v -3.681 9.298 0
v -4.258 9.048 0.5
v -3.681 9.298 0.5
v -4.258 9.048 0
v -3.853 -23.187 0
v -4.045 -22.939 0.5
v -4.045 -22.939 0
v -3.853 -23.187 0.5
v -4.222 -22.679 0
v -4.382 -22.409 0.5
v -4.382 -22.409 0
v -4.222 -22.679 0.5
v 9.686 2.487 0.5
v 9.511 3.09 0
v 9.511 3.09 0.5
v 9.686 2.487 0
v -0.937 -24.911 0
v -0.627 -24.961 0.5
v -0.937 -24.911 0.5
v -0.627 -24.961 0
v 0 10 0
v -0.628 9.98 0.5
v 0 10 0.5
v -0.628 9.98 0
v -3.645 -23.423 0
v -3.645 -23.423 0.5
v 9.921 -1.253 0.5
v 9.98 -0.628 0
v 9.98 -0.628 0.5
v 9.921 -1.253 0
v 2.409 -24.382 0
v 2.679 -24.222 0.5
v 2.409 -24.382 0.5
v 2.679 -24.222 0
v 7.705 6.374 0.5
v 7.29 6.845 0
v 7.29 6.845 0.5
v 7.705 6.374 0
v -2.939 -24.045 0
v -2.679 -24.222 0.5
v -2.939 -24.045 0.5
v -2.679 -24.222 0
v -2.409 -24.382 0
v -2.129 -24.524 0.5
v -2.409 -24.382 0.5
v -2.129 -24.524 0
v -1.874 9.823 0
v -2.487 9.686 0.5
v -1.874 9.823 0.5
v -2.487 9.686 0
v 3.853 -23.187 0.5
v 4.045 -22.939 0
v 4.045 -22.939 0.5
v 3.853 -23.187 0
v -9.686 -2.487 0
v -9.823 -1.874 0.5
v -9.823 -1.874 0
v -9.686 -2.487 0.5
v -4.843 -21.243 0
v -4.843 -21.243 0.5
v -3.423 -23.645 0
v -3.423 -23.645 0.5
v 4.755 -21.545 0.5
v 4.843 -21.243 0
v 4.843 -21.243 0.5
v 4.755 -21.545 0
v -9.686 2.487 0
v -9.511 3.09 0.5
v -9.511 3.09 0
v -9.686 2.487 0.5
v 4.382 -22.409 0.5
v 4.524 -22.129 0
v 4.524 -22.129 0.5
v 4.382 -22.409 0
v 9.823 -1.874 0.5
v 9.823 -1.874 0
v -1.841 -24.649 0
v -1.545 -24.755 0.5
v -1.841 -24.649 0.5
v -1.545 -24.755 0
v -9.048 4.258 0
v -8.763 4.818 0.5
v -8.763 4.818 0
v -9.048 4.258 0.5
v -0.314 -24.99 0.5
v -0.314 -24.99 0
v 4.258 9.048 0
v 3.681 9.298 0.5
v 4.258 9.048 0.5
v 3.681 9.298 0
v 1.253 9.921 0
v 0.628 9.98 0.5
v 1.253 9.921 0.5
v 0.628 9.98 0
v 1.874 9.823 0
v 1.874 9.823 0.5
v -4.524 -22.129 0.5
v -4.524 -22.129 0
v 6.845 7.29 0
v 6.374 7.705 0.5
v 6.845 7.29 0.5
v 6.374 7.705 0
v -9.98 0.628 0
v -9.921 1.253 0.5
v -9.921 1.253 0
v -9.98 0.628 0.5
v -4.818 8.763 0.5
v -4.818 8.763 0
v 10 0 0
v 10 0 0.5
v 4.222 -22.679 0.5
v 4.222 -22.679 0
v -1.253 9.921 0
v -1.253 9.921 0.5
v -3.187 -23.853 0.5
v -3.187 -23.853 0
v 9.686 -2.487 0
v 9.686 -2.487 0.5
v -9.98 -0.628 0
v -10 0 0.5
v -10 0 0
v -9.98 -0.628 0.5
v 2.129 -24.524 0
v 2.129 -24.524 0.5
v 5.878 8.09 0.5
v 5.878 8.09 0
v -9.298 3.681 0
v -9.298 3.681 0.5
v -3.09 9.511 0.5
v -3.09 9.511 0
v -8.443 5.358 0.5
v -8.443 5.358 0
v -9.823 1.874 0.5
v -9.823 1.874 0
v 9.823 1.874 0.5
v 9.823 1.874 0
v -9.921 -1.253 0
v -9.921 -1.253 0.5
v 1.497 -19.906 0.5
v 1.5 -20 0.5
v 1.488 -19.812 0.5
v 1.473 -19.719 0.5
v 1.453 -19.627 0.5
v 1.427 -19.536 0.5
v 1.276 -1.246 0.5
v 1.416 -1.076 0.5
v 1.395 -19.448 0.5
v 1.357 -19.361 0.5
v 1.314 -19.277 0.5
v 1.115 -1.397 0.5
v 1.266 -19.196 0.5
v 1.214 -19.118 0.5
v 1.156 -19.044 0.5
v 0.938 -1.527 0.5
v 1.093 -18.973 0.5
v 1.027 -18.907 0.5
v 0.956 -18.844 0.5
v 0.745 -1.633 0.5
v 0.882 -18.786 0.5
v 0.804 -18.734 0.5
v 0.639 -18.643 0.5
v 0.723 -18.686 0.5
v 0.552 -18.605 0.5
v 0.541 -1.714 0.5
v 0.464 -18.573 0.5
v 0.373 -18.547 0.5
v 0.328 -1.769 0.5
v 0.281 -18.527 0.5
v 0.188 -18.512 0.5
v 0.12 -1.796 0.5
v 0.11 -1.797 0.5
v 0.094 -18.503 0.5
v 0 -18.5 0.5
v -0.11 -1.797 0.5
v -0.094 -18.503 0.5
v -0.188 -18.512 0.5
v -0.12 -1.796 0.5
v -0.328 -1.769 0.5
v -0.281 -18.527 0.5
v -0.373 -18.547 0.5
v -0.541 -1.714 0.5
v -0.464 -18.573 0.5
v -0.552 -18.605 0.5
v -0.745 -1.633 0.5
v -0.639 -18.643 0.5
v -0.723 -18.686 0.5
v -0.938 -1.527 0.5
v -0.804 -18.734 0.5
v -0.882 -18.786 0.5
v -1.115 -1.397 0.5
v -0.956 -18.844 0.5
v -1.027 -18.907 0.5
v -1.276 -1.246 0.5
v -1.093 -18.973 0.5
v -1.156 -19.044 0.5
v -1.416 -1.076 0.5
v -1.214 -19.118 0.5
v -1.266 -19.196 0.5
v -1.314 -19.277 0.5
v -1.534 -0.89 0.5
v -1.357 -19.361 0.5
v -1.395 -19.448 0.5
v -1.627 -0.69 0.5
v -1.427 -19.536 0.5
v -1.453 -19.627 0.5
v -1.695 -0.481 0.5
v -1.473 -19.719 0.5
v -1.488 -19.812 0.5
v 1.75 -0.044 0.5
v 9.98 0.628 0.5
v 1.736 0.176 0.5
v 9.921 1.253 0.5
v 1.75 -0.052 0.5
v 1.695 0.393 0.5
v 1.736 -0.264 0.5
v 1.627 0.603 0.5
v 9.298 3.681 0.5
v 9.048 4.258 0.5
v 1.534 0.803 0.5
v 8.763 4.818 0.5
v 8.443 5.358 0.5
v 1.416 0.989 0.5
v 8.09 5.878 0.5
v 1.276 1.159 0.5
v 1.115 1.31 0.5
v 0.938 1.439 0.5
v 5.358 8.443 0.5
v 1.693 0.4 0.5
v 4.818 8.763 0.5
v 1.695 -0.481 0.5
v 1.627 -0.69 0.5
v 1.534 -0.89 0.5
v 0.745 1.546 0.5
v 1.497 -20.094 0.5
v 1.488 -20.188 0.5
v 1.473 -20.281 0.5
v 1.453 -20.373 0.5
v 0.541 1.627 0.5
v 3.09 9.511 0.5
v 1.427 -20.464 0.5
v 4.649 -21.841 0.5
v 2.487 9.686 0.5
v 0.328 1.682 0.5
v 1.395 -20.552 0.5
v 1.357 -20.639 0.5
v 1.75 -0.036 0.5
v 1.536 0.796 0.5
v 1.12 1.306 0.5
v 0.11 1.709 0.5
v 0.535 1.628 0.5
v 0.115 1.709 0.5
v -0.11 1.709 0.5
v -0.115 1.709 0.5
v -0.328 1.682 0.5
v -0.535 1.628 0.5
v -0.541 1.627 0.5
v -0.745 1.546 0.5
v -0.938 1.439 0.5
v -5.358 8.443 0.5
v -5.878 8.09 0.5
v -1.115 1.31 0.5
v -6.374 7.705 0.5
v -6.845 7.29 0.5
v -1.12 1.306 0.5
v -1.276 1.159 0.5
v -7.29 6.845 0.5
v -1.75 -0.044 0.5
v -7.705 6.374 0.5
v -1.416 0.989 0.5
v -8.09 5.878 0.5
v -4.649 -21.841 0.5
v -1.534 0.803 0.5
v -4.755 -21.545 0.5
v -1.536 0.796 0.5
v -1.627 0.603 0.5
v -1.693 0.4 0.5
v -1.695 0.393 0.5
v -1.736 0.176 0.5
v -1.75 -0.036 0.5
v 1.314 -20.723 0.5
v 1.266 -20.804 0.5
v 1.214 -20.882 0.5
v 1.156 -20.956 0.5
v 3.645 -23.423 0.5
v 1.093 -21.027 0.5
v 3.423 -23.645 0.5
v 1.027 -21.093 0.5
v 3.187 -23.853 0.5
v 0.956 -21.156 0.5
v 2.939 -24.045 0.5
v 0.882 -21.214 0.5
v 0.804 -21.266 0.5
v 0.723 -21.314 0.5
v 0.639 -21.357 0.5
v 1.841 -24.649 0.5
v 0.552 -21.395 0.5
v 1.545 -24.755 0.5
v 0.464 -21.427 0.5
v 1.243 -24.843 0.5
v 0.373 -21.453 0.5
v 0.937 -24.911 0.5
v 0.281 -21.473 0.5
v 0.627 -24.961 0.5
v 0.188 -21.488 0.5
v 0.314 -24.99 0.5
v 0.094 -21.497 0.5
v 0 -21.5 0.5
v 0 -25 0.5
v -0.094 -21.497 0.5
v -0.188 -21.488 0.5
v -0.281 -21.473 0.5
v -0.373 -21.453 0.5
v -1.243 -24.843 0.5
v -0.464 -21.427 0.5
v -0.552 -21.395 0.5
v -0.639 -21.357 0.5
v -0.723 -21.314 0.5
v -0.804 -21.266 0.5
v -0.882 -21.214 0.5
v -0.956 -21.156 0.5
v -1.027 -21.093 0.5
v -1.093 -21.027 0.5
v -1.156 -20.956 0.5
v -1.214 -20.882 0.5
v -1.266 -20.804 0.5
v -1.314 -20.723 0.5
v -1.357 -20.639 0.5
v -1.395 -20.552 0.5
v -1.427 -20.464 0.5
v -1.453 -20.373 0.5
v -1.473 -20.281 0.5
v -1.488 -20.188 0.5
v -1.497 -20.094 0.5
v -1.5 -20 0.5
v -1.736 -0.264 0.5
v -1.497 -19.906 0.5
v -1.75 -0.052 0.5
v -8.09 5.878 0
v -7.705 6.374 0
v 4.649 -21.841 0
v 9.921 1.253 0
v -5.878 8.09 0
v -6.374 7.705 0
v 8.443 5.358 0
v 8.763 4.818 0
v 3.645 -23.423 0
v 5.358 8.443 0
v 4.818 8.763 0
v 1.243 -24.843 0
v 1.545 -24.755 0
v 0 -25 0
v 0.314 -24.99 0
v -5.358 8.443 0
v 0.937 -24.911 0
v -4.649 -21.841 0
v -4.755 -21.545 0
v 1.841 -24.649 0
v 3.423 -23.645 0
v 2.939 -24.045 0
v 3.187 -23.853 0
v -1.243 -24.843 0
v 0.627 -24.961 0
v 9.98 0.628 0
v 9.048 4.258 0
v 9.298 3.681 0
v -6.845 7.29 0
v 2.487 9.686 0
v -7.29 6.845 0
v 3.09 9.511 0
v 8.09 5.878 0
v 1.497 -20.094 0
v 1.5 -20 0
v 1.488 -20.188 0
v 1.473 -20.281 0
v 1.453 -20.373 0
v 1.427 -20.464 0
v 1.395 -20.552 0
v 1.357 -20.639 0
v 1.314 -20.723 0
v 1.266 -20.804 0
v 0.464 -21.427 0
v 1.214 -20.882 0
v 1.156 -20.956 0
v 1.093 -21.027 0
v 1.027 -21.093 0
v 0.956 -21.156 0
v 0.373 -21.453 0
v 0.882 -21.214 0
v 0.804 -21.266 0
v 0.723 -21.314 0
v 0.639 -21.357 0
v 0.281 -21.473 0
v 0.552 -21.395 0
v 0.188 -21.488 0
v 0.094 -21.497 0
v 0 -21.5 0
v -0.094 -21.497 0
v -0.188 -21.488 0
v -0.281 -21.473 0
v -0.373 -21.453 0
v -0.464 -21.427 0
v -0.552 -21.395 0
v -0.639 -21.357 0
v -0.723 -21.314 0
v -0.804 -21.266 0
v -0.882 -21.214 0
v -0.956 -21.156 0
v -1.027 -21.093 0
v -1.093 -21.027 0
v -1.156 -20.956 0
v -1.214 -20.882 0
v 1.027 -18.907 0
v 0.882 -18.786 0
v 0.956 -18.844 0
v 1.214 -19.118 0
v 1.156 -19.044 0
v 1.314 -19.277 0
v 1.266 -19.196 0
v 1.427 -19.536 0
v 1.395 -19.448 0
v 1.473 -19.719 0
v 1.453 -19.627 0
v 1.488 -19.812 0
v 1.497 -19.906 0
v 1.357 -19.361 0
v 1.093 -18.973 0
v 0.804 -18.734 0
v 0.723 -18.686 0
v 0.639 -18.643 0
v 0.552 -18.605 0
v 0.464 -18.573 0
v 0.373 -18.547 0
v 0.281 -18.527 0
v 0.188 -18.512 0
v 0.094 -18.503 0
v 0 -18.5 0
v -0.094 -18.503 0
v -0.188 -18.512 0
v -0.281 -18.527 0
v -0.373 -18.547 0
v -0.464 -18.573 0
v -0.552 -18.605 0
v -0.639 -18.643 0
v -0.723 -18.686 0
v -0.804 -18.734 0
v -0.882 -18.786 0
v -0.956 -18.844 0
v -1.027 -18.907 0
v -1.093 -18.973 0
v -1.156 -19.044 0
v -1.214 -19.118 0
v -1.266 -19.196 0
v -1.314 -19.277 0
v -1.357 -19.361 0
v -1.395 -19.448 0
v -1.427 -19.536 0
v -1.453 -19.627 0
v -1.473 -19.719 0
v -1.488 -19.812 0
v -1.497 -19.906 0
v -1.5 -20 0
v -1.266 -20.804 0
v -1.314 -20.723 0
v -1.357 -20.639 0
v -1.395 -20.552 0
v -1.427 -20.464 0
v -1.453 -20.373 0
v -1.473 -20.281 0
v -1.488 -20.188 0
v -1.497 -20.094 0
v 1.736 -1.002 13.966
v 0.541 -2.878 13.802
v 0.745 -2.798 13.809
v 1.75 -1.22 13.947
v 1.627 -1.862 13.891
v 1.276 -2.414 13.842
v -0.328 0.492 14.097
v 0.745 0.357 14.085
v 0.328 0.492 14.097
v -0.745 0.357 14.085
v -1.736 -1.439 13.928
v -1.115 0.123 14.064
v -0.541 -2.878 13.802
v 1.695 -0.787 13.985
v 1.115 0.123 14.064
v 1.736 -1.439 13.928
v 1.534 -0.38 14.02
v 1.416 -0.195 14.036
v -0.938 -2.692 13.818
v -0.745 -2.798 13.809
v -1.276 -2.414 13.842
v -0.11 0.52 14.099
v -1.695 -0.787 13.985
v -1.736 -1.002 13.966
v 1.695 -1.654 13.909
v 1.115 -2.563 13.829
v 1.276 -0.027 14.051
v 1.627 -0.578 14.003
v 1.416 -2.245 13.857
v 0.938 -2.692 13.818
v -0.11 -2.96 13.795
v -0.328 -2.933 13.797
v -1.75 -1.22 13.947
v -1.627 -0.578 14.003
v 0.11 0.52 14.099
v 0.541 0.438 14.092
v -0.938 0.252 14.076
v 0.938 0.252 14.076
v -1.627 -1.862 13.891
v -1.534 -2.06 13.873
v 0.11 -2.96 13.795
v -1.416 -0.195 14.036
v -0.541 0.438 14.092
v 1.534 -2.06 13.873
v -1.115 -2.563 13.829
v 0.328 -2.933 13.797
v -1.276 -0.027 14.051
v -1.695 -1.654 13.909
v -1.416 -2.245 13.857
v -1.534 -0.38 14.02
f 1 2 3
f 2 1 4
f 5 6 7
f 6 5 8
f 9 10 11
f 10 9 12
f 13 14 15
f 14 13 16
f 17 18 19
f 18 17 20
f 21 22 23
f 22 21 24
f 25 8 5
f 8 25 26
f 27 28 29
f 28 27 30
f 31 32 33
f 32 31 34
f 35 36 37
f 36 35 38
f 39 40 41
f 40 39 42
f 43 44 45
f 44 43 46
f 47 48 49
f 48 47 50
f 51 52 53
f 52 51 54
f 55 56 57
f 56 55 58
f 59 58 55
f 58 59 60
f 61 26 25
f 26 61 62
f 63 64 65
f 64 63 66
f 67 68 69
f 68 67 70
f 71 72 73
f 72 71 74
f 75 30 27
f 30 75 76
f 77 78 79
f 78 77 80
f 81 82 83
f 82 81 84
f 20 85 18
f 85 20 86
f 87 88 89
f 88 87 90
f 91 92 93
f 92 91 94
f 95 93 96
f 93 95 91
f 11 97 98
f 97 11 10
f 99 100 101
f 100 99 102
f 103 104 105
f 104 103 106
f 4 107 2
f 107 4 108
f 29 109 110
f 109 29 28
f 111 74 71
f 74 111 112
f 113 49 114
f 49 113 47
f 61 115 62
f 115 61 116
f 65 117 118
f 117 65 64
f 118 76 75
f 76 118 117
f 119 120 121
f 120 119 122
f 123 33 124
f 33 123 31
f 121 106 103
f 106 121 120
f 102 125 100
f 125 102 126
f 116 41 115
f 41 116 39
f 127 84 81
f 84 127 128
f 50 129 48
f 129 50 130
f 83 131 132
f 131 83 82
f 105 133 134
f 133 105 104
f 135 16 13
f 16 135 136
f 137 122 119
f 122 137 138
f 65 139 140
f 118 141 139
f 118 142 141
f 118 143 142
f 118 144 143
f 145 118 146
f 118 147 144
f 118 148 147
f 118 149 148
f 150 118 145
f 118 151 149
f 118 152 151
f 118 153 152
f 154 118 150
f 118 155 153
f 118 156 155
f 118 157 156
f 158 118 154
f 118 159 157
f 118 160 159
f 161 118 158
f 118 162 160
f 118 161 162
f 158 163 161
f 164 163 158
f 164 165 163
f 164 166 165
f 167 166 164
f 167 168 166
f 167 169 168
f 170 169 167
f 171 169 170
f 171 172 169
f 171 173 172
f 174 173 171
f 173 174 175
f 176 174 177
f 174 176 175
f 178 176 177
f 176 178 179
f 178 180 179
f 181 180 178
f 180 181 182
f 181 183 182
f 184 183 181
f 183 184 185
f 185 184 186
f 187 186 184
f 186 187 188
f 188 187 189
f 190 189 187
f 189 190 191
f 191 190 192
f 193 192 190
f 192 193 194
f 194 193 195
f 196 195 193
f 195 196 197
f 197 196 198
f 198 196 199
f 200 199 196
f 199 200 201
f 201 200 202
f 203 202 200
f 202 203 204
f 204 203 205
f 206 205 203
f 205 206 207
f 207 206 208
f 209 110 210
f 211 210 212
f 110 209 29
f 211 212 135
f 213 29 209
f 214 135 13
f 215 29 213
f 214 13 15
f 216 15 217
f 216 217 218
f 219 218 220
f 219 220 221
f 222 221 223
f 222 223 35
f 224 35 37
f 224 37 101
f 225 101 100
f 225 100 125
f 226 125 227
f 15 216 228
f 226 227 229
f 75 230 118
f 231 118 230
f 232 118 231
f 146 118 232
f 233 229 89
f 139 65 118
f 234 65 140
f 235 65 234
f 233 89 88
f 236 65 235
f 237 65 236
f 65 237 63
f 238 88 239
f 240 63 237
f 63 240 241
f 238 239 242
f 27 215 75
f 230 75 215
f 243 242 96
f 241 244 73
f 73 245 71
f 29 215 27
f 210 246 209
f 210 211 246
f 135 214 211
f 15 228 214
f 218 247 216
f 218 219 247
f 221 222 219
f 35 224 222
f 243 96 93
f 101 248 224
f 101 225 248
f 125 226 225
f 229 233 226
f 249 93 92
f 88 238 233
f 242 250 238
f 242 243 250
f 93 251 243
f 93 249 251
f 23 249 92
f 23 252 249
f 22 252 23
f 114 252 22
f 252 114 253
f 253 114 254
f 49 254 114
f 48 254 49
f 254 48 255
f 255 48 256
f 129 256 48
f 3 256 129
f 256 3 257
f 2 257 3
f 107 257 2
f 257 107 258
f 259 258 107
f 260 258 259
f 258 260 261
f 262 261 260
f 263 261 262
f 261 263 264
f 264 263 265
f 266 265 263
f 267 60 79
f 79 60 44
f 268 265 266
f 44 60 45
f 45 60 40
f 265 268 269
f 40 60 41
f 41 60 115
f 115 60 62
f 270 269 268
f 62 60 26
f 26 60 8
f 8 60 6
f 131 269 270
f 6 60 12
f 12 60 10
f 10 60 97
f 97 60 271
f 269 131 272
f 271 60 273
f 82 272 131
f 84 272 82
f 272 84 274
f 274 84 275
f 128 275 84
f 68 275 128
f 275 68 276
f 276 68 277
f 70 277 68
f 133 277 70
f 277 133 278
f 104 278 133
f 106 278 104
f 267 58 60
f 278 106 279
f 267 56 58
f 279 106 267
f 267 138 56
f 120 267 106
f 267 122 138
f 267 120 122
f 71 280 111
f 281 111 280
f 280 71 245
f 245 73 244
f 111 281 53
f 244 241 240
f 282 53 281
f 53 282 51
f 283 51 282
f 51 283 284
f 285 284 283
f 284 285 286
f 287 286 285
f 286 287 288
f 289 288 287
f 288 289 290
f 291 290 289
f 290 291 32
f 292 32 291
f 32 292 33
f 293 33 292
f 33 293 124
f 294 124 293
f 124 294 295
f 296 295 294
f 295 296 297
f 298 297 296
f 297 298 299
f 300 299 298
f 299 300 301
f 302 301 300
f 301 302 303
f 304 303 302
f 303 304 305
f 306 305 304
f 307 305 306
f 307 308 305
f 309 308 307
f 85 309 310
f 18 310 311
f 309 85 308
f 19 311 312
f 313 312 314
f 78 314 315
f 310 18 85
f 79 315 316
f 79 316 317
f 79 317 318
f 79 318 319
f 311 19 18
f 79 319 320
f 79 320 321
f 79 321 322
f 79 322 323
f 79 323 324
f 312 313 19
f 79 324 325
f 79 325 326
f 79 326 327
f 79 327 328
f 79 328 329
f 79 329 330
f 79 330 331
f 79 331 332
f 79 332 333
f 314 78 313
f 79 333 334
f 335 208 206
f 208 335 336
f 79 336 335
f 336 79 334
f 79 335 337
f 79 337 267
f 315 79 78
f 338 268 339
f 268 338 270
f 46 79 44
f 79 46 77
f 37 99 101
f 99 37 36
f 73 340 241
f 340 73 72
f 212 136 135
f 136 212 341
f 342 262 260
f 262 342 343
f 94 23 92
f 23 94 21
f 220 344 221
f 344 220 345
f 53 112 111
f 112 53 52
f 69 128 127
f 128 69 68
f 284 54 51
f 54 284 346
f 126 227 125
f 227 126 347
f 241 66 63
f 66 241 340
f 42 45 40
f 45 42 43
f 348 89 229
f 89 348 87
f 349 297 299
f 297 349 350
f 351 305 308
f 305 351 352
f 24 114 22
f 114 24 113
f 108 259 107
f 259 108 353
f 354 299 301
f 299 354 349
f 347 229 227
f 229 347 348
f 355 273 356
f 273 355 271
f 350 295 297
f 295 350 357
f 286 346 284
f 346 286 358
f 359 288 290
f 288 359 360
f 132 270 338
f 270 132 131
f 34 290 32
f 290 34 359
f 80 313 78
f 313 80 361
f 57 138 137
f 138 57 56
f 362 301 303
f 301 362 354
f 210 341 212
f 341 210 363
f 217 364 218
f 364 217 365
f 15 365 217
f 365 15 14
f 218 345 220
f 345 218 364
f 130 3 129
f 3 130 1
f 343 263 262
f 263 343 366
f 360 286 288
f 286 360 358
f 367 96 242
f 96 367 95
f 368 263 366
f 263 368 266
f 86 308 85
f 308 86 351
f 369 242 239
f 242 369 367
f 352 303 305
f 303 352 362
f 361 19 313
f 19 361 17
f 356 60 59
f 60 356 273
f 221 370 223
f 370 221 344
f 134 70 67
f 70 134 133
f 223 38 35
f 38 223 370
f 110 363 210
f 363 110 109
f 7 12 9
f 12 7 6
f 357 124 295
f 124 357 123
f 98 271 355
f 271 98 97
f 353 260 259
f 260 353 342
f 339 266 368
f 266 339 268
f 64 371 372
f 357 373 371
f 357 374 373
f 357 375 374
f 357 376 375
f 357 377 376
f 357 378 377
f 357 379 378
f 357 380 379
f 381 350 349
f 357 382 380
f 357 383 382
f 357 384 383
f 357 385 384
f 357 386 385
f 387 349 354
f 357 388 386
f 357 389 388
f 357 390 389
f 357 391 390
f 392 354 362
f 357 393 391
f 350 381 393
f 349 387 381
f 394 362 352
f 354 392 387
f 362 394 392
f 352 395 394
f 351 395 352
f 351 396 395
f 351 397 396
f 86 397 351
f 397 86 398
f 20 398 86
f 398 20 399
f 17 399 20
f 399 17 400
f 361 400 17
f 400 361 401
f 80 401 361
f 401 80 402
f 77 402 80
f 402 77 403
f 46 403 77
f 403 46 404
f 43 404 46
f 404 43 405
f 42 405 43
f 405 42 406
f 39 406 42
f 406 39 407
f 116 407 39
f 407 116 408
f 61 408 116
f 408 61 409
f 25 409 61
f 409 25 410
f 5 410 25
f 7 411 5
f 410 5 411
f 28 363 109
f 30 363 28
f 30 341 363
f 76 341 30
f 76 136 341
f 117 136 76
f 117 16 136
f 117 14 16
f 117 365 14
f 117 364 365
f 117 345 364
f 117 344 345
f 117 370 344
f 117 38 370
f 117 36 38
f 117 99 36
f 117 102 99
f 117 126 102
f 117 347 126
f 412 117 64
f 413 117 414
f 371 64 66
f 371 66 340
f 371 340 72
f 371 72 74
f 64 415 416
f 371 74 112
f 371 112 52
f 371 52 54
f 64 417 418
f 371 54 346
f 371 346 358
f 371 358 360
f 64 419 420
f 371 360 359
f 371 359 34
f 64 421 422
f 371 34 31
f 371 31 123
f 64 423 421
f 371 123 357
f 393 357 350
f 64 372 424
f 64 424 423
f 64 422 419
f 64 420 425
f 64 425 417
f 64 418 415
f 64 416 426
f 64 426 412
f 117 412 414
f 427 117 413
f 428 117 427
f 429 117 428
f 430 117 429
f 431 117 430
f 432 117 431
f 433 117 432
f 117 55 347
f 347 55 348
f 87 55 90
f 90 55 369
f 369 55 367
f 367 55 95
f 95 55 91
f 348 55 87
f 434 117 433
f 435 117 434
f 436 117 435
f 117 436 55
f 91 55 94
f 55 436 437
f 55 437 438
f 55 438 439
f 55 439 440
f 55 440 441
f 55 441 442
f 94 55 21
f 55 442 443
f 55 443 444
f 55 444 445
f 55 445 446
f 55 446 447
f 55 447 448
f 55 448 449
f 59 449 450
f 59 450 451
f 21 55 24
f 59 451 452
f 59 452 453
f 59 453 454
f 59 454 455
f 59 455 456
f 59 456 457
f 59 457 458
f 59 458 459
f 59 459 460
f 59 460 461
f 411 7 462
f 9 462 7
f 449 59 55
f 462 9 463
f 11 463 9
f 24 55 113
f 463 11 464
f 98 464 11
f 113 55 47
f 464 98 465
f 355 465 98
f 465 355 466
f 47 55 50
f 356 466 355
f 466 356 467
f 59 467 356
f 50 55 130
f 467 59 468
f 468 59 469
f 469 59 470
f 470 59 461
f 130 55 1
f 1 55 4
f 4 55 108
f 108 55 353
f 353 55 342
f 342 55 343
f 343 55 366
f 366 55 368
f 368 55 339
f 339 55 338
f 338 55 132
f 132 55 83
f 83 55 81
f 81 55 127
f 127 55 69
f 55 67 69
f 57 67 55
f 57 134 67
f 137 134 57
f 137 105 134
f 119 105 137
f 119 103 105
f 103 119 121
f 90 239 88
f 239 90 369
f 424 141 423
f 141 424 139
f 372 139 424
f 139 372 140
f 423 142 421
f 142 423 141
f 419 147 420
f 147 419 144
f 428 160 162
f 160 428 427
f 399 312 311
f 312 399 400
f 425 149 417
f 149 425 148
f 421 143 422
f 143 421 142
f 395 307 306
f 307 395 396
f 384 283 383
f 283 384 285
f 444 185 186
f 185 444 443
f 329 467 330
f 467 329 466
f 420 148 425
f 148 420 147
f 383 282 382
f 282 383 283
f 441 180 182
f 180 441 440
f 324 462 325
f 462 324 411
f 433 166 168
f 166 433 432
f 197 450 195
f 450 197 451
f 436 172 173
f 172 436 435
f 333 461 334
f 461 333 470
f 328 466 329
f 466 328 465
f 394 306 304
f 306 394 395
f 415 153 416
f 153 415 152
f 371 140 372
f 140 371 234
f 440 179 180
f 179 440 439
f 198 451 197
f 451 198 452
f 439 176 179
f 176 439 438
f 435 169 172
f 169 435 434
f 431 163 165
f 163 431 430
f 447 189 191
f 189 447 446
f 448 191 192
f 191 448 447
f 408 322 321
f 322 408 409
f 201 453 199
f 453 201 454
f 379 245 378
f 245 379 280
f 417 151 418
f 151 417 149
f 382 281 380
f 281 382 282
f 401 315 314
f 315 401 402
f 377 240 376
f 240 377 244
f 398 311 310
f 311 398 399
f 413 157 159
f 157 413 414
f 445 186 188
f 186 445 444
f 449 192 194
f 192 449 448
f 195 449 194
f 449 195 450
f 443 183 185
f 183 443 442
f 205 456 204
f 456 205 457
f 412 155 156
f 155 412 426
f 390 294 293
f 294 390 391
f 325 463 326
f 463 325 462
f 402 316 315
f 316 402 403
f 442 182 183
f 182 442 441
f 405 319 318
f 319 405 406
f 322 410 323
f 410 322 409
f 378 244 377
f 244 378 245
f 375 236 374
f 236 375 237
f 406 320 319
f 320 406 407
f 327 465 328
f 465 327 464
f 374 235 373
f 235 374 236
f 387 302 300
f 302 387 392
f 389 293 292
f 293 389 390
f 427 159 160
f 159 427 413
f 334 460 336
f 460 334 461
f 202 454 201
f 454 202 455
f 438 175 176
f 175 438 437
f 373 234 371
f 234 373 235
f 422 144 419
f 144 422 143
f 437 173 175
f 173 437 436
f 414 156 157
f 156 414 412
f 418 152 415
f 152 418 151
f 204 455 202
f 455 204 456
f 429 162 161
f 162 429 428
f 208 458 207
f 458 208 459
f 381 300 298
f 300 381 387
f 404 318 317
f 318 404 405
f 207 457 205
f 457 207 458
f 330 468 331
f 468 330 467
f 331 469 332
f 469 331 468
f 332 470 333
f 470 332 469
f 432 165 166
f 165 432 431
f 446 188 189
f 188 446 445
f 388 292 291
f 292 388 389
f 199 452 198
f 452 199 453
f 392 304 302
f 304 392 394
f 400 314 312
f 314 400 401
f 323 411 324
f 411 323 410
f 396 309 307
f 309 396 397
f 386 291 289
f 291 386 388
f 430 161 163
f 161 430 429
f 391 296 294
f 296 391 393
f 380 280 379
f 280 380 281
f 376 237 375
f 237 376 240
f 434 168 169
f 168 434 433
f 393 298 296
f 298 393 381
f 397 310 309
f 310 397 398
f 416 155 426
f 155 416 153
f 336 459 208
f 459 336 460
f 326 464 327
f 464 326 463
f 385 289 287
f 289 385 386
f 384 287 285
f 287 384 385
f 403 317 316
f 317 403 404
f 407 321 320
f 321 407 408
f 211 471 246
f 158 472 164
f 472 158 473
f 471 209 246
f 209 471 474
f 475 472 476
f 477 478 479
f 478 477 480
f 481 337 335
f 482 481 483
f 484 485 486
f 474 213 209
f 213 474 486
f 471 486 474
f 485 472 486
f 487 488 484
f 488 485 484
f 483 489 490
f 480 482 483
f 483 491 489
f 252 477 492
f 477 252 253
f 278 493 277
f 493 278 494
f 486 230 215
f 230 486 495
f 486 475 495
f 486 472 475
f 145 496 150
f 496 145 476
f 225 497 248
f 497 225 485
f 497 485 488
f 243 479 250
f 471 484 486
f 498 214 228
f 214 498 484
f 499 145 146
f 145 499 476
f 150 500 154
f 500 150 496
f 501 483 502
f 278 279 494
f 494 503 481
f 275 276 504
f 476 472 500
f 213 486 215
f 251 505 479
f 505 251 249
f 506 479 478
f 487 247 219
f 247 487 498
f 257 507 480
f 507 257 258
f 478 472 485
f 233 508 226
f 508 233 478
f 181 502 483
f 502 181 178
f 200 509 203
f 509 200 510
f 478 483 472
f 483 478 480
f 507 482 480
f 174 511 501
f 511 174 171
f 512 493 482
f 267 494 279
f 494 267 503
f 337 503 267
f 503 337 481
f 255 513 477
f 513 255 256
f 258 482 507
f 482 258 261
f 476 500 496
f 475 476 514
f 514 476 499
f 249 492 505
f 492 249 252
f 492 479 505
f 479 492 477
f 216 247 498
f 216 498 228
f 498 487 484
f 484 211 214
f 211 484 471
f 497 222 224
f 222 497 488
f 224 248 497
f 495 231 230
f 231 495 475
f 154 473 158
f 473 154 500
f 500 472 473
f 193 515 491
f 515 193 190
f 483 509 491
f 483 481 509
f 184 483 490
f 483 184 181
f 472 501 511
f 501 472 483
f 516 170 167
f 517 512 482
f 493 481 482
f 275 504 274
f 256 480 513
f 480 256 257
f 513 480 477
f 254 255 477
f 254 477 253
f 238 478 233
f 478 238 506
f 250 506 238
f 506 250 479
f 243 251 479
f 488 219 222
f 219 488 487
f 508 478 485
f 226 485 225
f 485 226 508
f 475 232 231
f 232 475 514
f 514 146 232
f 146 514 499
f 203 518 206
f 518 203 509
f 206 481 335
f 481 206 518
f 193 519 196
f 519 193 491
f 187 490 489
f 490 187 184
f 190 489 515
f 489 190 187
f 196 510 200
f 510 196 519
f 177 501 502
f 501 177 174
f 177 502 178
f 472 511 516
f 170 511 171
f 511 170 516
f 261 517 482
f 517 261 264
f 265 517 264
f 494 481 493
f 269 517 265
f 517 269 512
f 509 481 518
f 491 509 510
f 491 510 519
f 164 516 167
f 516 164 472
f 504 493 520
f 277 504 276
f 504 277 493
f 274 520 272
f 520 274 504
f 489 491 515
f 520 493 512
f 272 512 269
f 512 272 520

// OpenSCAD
// bottom
difference()
{
  hull()
  {
    cylinder(d=20, h=0.5, $fn=100);
    translate([0, -20, 0])
      cylinder(d=10, h=0.5, $fn=100);
  }
  // hole
  translate([0, -20, -1])
    cylinder(d=3, h=0.5+2, $fn=100);
}

// hook
intersection()
{
  rotate([5, 0, 0])
    cylinder(d=3.5, h=14, $fn=50);
  cylinder(d=15, h=30, $fn=5);
}
